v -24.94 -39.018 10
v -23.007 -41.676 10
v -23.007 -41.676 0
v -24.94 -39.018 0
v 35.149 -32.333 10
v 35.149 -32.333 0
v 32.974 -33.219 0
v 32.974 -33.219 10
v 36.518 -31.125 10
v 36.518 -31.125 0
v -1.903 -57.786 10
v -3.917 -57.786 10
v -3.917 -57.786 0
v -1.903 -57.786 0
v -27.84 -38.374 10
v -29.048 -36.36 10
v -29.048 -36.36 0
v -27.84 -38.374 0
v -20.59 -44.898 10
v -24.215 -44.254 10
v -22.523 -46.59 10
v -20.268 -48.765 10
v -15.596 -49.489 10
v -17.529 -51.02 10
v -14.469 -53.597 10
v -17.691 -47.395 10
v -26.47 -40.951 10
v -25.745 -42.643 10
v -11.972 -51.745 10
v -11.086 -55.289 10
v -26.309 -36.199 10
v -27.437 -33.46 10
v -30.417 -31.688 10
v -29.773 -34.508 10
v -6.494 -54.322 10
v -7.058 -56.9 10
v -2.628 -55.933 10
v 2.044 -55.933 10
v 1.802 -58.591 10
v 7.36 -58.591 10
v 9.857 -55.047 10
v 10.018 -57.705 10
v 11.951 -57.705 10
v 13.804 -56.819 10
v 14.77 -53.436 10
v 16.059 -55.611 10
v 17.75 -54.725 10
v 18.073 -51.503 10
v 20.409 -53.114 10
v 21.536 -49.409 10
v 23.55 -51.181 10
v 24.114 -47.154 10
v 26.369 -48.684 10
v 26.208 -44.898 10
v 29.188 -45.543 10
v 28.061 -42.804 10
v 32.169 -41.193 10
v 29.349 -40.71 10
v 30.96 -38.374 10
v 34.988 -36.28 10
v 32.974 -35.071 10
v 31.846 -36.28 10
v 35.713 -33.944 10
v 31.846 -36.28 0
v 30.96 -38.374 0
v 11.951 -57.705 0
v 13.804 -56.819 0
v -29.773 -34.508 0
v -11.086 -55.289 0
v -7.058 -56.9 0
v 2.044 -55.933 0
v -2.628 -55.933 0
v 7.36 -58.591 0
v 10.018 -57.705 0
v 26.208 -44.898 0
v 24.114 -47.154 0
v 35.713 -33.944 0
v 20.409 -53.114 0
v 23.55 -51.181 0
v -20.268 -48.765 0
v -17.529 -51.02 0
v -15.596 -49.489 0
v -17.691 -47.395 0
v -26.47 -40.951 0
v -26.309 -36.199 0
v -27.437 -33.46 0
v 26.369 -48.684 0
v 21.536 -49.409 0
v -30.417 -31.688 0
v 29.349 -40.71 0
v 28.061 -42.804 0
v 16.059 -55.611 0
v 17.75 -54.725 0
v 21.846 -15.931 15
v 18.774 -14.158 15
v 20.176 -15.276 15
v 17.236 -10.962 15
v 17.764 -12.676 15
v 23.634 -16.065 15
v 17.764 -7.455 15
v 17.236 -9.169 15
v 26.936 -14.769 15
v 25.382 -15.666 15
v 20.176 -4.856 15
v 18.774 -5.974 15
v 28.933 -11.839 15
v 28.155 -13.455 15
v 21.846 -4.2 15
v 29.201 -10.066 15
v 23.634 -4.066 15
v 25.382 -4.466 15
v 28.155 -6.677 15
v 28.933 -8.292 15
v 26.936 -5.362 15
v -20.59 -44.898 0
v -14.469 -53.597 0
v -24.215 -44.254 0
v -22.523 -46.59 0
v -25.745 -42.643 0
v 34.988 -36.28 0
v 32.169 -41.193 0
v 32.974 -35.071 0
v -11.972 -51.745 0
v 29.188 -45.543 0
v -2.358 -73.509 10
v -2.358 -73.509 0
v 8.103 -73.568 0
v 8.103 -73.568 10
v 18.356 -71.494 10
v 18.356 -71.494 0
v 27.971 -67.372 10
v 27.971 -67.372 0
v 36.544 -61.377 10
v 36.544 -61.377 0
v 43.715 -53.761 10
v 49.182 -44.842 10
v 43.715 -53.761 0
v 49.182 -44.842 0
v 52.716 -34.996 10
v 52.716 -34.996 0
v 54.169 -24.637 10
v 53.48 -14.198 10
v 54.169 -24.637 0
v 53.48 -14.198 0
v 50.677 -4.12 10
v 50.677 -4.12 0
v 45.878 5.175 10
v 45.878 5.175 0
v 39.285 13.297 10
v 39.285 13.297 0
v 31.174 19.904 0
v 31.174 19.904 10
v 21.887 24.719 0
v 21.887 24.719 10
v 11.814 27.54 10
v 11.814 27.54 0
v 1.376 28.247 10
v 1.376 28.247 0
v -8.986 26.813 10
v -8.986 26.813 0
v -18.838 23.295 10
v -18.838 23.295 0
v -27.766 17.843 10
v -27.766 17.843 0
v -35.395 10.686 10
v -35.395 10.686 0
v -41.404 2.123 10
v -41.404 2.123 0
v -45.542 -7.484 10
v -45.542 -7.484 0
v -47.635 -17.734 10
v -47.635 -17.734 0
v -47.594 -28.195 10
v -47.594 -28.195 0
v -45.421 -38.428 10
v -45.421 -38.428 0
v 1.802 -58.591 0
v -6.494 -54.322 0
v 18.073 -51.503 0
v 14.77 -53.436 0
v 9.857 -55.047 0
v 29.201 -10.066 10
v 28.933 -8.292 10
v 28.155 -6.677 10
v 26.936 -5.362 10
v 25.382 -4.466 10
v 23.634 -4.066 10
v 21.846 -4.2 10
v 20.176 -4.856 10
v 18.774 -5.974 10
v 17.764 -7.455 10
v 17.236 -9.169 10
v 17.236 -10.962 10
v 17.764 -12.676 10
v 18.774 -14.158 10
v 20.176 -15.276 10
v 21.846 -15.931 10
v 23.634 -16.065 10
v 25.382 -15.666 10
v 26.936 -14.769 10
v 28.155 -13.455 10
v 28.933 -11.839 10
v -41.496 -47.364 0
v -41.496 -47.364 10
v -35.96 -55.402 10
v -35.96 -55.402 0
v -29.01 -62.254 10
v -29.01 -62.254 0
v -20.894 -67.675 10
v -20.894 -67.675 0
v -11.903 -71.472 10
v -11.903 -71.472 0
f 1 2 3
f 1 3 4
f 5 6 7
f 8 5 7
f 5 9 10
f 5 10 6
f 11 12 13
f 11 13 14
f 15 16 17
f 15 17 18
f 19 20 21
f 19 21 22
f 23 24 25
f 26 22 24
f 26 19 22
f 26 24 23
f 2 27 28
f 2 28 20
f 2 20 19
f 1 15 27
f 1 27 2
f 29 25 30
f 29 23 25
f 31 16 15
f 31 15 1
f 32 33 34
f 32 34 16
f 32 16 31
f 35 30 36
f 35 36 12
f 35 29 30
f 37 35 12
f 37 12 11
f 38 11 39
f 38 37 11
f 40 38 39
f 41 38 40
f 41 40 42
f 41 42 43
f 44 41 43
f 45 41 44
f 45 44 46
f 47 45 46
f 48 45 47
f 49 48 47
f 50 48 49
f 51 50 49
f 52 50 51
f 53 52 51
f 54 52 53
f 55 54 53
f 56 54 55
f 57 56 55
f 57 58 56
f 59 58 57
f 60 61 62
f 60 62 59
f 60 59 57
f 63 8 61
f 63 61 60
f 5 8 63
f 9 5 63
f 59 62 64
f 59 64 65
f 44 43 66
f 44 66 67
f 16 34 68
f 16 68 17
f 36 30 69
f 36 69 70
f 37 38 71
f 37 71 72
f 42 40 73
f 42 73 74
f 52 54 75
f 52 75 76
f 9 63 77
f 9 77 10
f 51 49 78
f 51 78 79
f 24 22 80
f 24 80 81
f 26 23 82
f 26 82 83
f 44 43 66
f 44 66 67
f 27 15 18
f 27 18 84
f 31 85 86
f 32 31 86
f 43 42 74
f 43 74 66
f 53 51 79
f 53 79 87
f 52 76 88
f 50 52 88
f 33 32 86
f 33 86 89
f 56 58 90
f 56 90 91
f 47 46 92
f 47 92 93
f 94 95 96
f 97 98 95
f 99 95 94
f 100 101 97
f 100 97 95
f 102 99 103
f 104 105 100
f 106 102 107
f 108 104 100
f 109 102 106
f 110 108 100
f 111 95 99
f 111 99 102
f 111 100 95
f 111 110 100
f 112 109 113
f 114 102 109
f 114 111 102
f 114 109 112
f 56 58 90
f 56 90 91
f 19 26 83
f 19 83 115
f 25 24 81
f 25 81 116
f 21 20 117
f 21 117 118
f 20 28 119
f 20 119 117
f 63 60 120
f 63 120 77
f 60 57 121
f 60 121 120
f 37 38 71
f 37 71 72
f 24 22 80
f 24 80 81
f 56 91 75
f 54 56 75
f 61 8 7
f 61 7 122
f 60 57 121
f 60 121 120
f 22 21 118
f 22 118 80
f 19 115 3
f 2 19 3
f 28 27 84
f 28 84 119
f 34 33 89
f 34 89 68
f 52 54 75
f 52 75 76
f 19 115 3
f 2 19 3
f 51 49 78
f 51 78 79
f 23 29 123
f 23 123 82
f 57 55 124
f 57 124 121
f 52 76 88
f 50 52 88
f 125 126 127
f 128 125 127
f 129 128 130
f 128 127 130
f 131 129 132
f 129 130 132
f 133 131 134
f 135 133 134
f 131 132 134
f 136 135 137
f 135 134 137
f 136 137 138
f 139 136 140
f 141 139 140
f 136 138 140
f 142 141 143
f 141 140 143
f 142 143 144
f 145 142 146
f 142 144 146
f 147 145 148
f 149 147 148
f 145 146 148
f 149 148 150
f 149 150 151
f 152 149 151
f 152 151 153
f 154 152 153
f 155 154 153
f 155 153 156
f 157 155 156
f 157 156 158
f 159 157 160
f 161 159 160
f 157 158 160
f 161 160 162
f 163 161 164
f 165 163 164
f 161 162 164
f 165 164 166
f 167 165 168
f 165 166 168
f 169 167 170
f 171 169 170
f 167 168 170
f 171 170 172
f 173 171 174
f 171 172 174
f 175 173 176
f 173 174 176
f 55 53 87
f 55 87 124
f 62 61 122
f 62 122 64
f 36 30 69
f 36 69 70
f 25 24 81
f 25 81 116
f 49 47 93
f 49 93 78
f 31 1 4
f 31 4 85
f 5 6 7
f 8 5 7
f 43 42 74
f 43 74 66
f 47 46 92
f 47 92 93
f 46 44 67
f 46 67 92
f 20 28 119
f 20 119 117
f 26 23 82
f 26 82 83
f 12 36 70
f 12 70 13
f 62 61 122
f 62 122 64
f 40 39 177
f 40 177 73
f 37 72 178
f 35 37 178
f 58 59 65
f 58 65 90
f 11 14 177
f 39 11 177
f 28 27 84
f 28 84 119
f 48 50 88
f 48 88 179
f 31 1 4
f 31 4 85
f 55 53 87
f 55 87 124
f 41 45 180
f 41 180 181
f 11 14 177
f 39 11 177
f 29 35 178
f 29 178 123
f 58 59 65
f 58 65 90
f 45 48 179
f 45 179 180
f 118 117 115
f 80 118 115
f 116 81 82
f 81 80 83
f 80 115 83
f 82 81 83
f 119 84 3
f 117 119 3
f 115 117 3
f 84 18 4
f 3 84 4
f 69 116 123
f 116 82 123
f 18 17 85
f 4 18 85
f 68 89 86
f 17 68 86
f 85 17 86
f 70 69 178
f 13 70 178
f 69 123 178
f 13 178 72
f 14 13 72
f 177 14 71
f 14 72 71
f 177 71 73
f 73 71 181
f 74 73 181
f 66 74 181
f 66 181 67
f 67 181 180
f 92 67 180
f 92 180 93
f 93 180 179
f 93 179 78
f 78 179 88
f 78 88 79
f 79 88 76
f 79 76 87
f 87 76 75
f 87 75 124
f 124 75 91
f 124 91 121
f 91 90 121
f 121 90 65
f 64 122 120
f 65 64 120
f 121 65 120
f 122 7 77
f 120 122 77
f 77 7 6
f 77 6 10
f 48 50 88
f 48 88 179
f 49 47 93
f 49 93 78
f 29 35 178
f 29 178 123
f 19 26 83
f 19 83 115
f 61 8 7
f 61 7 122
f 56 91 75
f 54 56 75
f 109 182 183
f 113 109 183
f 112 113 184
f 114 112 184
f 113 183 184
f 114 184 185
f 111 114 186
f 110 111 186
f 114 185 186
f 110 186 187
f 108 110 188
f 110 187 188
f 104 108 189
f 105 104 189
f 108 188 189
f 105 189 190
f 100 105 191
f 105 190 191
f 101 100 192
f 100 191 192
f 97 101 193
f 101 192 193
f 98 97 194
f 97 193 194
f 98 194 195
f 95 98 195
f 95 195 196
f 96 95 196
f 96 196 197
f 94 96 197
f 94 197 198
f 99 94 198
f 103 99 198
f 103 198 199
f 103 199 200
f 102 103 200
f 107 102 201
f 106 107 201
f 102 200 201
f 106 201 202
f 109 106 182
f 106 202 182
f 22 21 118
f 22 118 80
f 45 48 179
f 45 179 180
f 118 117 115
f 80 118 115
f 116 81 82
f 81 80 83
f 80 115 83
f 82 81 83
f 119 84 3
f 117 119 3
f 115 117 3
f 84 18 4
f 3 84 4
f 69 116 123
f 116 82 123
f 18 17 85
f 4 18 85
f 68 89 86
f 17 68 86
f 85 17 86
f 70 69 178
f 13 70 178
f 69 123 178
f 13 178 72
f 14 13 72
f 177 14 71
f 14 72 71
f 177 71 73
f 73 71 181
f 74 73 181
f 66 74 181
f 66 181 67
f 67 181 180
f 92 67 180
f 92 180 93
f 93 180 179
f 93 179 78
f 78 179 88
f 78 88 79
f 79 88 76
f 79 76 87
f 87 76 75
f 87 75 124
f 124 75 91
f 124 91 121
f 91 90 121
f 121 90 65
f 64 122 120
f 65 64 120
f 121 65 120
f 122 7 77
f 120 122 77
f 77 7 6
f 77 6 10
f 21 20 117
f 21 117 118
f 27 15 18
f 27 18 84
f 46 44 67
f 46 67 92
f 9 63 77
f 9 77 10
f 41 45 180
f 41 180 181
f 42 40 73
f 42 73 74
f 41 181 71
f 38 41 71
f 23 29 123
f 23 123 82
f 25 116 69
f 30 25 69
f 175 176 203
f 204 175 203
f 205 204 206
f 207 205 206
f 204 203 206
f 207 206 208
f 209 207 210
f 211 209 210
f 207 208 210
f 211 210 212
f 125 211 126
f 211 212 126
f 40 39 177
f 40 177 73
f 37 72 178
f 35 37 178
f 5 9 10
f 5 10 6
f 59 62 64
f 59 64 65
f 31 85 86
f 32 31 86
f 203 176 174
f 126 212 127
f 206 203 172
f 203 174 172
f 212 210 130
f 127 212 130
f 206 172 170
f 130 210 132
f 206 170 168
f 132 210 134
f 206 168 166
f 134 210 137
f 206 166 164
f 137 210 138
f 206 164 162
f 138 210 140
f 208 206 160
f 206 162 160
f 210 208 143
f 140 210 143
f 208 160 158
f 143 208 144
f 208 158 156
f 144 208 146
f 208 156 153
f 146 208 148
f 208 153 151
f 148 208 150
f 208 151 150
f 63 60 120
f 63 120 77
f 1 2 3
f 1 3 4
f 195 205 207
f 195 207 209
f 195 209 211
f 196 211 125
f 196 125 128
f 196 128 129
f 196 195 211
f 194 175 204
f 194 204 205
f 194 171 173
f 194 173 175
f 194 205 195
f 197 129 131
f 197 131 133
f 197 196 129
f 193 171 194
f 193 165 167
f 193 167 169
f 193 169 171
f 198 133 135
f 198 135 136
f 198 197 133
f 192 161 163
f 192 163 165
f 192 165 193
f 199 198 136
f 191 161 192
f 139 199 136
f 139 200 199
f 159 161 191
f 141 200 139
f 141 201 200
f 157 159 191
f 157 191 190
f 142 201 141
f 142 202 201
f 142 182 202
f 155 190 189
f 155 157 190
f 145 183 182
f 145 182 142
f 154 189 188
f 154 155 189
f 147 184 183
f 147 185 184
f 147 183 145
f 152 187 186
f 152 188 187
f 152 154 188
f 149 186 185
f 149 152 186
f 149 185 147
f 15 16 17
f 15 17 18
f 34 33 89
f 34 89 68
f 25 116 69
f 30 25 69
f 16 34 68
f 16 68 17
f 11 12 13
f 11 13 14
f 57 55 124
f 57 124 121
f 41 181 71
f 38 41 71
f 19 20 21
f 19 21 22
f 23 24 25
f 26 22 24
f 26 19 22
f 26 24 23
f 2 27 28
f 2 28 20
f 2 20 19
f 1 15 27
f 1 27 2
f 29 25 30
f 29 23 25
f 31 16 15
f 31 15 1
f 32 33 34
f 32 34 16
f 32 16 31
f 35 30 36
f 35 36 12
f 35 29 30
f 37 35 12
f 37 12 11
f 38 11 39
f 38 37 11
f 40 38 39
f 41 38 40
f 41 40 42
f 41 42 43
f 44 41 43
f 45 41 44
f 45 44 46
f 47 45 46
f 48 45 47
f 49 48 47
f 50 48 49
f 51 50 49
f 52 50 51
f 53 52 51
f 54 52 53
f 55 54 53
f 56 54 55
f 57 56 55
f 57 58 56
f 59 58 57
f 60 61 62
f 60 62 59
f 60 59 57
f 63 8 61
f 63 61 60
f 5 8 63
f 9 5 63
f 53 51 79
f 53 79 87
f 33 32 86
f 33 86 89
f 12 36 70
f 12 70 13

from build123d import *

# Parameters (mm, degrees)
F2_DEPTH  = 10
F3_R      = 6.0161074482
F4_DEPTH  = 5
F9_DEPTH  = 10
F10_DEPTH = 10


# Not quite as in the source:
# - a feature names something its author has since deleted; it is built from what else it names
# - the program builds the solid bodies; features that only make, move or delete a surface that nothing else refers to are left out


with BuildPart() as f2:
    # F1 (on face) → F2 (new body)
    with BuildSketch(Plane.XY):
        with BuildLine():
            ThreePointArc((54.2036075933, -22.7648094296), (-4.7674624295, 27.6592306141), (-45.4207321783, -38.4277013217))
            ThreePointArc((-45.4207321783, -38.4277013217), (-29.0095050887, -62.25377047), (-2.3575475804, -73.5091294881))
            ThreePointArc((-2.3575475804, -73.5091294881), (37.2467444782, -60.7587243792), (54.2036075933, -22.7648094296))
        make_face()
    extrude(amount=F2_DEPTH)

    # F3 (on face) → F4 (join)
    with BuildSketch(Plane.XY.offset(10)):
        with Locations((23.184536978, -10.0657522977)):
            Circle(F3_R)
    extrude(amount=F4_DEPTH)


with BuildPart() as f9:
    # F7 (on face) → F9 (new body, through all)
    with BuildSketch(Plane.XY.offset(10)):
        Polygon((-27.4368692189, -33.4604494274), (-30.4171405733, -31.6883958876), (-29.7727547586, -34.5075726509), (-29.0478244424, -36.3601744175), (-27.8396084905, -38.3738689125), (-26.4702923596, -40.9514009953), (-25.7453620434, -42.6429063082), (-24.2149531841, -44.2538633943), (-22.5234478712, -46.5897507966), (-20.2681086957, -48.7645454705), (-17.5294801593, -51.0198846459), (-14.4686615095, -53.5974167287), (-11.0856518149, -55.2889220417), (-7.0582586341, -56.8998791277), (-3.9168912917, -57.7859058976), (-1.9031949341, -57.7859058976), (1.8020068528, -58.5913844407), (5.6683043949, -58.5913844407), (7.3598097079, -58.5913844407), (10.0178886205, -57.7053576708), (11.9510376826, -57.7053576708), (13.8036385179, -56.8193309009), (16.058979556, -55.6111112237), (17.7504848689, -54.7250844538), (20.4085633159, -53.1141273677), (23.5499292612, -51.1809810996), (26.3691060245, -48.6839972436), (29.1882790625, -45.542627573), (32.1685522795, -41.1930456758), (34.9877253175, -36.2796261907), (35.712659359, -33.9437350631), (36.518137902, -31.1245620251), (35.1488217711, -32.332777977), (32.9740308225, -33.2188047469), (32.9740308225, -35.0714065135), (31.8463593721, -36.2796261907), (30.9603344649, -38.3738689125), (29.3493773788, -40.7097563148), (28.0606094748, -42.8040027618), (26.2080114335, -44.8982454836), (24.1137649864, -47.1535846591), (21.5362329036, -49.4089275599), (18.0726759136, -51.5031702816), (14.7702135146, -53.4363202751), (9.8567930982, -55.0472773612), (2.0436504856, -55.933304131), (-2.628125716, -55.933304131), (-6.4944233745, -54.3223470449), (-11.9716776535, -51.7448149621), (-15.5963320285, -49.4894757867), (-17.6905766129, -47.3952293396), (-20.5902997404, -44.8982454836), (-23.0067353696, -41.6763313115), (-24.939885363, -39.0182510018), (-26.3091977686, -36.1990779638), align=None)
    extrude(amount=-F9_DEPTH)


with BuildPart() as f10:
    # F10 (new, through all): a face of the model
    f10_faces = [f9.part.faces().sort_by_distance(p)[0] for p in [
        (-4.8395499913, -55.7956867711, 10),
    ]]
    extrude(f10_faces, amount=-F10_DEPTH)


solid = Compound([f2.part, f9.part, f10.part])
